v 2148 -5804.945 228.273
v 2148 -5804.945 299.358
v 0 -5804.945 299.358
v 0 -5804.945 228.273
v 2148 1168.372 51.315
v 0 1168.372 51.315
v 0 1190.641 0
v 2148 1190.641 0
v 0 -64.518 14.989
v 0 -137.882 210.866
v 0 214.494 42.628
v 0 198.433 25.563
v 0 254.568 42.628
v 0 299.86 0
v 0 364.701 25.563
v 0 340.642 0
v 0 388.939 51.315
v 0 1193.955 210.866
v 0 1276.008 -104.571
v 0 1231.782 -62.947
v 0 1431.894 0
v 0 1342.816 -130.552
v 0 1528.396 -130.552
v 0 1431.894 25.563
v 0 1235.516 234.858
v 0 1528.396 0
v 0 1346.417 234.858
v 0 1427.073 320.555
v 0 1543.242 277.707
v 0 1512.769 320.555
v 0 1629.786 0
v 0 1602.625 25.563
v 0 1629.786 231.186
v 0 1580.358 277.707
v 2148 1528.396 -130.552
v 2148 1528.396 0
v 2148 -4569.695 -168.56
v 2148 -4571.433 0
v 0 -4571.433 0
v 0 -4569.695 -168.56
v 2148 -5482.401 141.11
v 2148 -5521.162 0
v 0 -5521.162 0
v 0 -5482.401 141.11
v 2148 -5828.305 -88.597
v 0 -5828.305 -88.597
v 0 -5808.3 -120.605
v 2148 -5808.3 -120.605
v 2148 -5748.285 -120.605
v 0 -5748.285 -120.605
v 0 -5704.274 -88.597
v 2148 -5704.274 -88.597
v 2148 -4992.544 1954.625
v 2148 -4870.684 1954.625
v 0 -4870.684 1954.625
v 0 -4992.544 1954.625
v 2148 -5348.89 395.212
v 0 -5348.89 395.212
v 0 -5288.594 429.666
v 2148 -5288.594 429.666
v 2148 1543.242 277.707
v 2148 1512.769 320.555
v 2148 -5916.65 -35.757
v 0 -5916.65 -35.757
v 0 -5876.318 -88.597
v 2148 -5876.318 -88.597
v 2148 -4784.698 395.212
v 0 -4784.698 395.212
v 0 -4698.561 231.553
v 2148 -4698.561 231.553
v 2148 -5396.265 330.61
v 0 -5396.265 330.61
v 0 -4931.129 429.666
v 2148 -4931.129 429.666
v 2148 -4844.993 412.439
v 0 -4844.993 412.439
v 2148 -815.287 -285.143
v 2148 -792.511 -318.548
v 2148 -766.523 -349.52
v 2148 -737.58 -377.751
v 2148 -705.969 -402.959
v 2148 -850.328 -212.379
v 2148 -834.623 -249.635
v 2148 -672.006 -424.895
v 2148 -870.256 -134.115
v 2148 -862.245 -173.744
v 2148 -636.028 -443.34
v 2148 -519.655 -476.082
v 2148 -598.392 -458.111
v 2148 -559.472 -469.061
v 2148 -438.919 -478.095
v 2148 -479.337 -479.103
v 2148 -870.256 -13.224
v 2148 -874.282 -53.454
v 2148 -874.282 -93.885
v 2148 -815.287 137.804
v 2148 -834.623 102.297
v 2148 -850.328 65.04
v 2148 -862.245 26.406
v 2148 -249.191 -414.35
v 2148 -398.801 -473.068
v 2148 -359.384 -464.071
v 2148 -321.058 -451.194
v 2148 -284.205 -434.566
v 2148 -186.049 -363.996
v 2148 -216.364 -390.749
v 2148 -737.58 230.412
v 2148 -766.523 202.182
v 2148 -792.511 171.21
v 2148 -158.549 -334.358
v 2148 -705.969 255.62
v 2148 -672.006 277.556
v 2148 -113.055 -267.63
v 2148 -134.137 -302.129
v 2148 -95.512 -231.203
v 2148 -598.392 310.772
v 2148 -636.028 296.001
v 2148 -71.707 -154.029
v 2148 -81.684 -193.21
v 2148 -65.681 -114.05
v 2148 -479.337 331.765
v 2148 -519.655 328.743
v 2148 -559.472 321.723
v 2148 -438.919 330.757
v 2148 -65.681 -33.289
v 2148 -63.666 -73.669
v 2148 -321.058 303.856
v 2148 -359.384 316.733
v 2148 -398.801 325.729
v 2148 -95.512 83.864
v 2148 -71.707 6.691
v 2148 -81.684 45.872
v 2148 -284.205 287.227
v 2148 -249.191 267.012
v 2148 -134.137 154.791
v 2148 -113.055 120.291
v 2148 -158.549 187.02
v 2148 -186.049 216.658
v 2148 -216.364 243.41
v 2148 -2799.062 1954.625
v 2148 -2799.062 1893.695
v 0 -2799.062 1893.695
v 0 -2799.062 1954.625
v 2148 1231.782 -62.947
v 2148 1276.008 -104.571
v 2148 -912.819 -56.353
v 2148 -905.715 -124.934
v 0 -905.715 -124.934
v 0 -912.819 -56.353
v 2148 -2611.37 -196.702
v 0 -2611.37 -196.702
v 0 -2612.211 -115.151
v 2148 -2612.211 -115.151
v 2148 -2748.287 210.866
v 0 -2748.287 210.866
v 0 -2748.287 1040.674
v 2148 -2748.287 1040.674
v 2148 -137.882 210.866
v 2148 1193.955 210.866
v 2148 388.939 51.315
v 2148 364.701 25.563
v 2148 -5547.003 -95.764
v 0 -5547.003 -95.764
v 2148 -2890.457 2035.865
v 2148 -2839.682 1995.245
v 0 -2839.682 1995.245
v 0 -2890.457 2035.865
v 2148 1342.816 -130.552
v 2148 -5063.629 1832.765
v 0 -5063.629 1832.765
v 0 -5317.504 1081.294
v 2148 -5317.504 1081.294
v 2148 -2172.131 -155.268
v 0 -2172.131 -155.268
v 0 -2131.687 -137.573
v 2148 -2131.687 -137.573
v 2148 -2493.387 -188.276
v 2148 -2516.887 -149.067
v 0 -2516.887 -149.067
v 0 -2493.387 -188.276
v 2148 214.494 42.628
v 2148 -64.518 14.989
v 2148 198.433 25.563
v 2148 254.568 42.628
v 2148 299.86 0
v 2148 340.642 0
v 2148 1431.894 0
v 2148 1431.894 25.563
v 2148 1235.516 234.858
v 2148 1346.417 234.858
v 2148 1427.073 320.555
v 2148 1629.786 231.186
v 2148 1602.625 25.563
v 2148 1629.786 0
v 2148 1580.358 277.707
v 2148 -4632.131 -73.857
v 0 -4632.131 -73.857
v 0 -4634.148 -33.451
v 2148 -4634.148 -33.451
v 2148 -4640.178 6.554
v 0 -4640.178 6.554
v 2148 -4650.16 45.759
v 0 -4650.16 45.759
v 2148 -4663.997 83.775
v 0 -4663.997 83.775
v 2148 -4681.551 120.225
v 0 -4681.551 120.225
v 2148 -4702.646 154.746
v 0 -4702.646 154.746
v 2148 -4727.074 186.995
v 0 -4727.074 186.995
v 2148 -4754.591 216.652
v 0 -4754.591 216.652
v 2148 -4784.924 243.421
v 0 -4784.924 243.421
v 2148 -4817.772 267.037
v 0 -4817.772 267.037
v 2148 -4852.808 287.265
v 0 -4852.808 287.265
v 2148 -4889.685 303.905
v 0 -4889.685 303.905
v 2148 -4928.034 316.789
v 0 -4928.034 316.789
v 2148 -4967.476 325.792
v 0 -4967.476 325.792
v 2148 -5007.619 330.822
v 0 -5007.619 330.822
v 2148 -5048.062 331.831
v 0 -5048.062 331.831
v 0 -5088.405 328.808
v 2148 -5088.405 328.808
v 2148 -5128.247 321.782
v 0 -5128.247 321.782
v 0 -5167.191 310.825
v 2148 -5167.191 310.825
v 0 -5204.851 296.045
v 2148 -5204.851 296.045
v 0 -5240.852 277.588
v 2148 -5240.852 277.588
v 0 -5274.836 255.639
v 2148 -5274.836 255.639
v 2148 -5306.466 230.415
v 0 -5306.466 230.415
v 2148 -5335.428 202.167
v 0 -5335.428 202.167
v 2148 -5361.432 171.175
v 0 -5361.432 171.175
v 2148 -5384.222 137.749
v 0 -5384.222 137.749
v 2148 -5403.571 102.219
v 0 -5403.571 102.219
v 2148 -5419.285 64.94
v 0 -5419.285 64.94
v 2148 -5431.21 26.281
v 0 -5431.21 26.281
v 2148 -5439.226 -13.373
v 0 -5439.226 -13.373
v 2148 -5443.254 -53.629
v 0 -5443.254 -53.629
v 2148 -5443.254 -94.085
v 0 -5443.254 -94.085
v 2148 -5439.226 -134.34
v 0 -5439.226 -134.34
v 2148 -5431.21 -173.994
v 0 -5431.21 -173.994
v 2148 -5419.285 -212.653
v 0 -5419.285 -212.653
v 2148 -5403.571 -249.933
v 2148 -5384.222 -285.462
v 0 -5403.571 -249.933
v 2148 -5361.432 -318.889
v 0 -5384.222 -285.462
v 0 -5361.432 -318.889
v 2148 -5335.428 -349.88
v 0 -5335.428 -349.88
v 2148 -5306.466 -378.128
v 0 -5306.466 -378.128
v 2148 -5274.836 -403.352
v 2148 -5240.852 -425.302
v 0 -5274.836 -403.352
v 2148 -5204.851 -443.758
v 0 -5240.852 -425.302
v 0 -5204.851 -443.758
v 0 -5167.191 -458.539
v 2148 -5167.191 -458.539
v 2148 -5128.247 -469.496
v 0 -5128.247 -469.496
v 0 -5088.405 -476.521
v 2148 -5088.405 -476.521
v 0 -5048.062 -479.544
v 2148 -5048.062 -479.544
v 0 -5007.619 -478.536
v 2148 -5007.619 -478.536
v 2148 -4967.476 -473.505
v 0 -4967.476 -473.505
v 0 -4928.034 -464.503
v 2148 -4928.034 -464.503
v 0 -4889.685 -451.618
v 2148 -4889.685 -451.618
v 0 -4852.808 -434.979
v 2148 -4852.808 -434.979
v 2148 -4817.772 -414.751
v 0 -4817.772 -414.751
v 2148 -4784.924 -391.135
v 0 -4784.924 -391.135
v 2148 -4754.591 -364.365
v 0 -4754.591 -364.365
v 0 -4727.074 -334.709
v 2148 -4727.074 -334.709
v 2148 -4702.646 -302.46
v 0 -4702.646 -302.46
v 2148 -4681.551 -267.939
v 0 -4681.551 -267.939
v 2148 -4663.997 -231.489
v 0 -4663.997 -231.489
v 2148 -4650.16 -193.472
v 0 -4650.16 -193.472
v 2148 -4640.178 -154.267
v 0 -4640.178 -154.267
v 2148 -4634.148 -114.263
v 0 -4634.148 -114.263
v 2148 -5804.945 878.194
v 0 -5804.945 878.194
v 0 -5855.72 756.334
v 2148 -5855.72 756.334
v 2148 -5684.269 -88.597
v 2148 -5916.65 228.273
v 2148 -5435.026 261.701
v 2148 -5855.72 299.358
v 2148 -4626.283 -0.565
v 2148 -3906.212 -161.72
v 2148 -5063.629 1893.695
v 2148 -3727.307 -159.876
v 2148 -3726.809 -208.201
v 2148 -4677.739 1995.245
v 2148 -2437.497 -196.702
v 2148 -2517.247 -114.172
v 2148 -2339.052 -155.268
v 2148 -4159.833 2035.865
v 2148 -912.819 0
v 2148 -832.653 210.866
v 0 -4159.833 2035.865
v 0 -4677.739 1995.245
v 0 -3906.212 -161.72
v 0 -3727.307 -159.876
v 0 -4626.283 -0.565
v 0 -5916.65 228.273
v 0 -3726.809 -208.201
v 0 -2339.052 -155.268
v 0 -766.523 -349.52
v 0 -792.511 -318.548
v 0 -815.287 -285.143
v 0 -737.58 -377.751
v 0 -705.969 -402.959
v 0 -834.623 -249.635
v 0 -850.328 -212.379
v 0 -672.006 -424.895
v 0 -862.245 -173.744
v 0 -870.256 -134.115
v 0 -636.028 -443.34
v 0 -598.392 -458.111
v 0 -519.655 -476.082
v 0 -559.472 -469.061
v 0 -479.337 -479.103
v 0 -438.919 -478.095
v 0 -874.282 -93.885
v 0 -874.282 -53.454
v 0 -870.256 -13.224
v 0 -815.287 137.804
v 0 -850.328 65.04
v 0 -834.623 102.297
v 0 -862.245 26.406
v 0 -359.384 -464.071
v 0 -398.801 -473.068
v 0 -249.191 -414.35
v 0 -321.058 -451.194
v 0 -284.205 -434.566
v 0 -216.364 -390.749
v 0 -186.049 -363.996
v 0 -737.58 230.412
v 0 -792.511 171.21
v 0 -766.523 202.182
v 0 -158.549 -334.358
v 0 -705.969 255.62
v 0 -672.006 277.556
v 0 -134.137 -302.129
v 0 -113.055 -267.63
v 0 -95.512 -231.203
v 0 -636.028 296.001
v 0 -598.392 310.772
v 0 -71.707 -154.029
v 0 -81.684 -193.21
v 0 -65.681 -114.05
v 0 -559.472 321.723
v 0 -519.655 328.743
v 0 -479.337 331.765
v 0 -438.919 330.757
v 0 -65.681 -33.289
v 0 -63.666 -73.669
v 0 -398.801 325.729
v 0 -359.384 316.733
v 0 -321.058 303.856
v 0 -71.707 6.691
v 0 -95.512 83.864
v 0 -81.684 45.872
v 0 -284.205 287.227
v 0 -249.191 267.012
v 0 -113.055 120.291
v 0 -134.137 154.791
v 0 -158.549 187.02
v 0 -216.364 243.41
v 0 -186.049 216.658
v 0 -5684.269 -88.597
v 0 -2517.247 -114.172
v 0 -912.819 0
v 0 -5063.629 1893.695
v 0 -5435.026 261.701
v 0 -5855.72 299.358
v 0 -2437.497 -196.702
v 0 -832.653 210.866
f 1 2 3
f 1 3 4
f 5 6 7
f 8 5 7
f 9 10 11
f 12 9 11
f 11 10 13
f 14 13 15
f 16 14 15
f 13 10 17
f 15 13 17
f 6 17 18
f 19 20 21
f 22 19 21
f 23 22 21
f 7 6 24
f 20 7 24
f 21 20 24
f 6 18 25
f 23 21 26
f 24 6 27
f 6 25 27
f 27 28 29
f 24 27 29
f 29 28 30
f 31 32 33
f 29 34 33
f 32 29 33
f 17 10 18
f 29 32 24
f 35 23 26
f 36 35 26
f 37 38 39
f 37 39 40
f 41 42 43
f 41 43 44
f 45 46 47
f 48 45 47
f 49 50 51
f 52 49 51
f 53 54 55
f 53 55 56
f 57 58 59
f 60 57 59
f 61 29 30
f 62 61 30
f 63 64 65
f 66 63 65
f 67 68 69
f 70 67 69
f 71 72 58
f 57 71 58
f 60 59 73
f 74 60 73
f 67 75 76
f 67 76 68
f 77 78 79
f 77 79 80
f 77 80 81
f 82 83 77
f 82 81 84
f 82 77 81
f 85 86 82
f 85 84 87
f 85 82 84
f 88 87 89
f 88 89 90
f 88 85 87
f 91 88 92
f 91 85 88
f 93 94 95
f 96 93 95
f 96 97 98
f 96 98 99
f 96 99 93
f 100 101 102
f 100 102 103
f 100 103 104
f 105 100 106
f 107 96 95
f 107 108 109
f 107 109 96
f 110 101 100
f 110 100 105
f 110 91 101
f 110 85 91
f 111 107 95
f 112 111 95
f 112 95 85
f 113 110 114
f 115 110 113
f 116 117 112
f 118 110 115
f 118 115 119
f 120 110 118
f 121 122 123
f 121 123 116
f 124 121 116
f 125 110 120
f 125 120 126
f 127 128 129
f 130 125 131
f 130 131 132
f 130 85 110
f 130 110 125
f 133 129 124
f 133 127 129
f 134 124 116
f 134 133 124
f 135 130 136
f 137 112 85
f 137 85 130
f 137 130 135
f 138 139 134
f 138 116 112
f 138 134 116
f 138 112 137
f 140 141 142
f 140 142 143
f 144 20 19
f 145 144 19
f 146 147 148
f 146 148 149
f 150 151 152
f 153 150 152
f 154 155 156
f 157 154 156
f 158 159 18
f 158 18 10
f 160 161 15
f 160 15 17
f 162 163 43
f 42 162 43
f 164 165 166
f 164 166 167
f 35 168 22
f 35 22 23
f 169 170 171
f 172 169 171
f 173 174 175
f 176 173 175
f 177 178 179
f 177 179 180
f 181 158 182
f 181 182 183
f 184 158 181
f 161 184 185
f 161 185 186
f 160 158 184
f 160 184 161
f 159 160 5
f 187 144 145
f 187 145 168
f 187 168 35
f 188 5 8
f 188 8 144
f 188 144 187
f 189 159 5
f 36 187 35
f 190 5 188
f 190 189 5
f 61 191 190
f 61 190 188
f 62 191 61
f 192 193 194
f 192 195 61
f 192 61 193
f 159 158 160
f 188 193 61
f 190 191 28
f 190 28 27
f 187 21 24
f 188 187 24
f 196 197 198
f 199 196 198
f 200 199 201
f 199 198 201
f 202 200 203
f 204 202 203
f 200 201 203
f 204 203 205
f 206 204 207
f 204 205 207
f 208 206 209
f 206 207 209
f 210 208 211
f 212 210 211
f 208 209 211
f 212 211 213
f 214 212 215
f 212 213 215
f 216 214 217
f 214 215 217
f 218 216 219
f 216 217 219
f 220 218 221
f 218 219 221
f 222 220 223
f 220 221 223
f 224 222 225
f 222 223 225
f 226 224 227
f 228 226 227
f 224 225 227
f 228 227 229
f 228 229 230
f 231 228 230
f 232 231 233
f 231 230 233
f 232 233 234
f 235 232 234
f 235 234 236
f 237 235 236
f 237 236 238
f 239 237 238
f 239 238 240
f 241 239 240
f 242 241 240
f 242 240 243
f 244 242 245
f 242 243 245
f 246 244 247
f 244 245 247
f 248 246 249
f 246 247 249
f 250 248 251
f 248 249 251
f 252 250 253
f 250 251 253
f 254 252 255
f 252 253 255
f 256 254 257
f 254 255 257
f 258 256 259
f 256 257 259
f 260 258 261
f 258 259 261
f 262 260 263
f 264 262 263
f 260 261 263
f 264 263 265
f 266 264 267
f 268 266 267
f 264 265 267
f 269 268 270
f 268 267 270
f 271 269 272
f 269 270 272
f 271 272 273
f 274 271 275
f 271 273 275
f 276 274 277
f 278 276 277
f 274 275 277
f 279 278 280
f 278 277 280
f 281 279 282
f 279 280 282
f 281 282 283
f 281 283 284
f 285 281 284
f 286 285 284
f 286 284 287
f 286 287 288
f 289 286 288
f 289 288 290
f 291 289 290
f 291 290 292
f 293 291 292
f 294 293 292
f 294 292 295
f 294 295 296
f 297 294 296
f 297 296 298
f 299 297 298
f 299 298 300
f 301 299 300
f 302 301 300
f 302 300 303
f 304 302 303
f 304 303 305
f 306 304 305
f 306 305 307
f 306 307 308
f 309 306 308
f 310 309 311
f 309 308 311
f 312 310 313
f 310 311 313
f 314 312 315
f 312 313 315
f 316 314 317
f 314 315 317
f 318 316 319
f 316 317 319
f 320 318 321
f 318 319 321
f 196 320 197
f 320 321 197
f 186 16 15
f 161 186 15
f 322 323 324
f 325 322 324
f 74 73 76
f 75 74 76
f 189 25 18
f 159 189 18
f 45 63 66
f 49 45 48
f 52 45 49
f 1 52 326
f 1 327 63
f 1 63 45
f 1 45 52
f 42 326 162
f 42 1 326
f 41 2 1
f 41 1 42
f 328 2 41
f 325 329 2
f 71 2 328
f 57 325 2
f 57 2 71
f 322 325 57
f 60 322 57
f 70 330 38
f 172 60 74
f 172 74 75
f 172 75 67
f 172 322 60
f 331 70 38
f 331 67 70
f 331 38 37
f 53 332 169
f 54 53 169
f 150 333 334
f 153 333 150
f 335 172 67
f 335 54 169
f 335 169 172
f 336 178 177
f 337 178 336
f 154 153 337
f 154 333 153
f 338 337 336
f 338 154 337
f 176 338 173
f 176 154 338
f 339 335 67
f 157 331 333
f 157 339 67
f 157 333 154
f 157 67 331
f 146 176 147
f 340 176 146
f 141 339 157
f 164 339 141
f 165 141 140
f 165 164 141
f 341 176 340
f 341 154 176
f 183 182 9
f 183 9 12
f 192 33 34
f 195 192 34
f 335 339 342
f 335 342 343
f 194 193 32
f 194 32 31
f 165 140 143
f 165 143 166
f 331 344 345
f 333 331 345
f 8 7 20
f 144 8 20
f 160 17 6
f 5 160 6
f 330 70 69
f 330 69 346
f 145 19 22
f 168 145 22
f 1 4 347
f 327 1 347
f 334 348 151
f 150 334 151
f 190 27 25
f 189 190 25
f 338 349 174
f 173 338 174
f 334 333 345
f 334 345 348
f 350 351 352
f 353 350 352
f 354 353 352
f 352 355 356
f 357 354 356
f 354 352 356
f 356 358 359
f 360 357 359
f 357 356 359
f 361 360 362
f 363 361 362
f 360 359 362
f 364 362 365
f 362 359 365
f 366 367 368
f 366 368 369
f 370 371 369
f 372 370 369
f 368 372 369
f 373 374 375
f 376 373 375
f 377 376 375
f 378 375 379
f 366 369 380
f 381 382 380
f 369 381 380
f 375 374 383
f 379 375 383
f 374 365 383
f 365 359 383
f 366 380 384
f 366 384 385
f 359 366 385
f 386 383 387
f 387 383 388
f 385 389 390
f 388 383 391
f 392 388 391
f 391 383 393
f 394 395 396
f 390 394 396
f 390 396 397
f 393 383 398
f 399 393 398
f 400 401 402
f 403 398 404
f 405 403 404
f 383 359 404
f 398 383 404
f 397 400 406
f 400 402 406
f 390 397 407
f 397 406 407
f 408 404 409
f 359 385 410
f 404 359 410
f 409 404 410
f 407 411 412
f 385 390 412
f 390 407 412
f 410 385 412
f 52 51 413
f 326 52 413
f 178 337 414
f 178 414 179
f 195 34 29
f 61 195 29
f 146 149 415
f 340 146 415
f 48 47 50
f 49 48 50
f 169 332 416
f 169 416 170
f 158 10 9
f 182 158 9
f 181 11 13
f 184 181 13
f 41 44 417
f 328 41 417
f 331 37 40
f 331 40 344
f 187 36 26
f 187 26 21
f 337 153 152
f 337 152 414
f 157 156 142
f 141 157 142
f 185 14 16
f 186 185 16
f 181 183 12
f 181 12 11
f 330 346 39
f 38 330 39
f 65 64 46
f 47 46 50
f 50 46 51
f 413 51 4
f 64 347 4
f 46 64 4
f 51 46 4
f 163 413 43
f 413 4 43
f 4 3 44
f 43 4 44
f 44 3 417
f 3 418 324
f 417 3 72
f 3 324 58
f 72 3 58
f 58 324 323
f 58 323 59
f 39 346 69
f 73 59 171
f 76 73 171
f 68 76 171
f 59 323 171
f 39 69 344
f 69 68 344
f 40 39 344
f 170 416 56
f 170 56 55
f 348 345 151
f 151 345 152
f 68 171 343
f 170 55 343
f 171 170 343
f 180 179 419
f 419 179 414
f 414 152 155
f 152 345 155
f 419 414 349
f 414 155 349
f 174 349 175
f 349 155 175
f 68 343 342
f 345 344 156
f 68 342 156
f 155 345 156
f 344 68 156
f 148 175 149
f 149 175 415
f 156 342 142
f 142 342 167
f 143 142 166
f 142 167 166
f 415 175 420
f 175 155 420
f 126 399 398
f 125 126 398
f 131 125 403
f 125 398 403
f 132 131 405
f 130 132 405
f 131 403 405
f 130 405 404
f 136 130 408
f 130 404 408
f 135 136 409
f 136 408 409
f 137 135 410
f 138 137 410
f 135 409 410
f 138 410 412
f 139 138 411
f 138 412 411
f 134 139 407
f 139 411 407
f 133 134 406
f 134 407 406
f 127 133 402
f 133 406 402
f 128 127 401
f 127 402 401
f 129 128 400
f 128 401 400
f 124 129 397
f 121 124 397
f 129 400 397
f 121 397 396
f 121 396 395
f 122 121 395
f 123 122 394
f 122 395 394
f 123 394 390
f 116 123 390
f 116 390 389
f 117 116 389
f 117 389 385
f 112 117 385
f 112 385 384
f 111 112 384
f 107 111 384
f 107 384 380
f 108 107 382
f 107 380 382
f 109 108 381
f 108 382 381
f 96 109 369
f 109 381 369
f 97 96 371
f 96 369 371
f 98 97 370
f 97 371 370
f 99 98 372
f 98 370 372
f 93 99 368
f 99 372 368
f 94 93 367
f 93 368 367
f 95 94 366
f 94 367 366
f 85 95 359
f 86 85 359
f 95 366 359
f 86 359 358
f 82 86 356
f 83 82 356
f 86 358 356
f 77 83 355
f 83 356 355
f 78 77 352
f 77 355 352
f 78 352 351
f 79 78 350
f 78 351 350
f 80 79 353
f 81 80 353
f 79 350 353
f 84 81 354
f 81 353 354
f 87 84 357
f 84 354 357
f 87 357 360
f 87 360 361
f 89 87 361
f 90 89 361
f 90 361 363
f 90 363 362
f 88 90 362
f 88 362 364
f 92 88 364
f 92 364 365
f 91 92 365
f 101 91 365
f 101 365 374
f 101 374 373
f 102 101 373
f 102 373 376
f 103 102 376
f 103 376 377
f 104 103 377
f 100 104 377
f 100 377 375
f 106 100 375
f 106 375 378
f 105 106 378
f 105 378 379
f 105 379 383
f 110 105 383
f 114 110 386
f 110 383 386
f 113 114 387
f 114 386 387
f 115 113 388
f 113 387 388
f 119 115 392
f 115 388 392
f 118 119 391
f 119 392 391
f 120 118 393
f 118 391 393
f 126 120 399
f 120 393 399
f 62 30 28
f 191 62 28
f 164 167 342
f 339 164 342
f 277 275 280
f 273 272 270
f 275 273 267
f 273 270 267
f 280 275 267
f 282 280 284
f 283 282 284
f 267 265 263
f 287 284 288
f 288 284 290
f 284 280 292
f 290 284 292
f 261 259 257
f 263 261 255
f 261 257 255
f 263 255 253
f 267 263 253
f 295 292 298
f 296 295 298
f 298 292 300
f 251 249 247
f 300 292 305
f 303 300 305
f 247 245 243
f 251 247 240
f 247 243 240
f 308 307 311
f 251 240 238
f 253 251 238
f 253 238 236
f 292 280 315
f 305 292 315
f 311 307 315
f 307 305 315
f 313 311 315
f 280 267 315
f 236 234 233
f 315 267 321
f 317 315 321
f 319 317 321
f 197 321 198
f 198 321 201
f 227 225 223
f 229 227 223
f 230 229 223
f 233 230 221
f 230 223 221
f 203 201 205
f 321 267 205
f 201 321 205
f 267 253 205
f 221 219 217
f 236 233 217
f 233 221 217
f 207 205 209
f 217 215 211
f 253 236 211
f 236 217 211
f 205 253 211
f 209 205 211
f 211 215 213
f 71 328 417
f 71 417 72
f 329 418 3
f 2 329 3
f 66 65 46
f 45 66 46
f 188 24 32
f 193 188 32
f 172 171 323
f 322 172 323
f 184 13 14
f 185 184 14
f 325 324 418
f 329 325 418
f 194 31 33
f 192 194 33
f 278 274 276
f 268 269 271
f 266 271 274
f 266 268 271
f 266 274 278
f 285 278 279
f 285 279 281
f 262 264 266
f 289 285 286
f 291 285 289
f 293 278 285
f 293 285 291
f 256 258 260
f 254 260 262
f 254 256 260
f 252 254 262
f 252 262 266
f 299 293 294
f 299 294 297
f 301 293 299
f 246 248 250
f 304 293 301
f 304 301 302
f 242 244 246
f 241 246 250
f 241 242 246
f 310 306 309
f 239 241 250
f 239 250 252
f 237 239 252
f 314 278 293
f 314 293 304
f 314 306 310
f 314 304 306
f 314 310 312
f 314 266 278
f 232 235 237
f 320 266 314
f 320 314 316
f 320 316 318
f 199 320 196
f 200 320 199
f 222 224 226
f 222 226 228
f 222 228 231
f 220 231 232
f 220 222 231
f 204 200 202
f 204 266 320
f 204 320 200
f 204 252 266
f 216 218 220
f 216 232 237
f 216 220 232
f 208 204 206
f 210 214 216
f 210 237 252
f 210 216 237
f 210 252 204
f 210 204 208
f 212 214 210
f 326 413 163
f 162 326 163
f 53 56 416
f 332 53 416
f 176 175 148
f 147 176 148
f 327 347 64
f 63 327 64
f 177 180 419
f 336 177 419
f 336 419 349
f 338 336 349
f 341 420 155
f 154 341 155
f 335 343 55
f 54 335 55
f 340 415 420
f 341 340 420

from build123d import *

# Parameters (mm, degrees)
F1_R     = 405.813739
F1_R_2   = 405.560096
F2_DEPTH = 2148
F3_DEPTH = 2148


with BuildPart() as f2:
    # F1 (on Right) → F2 (new body)
    with BuildSketch(Plane.YZ):
        with Locations((-5037.945043, -73.856739)):
            Circle(F1_R)
        with Locations((-469.226141, -73.669252)):
            Circle(F1_R_2)
    extrude(amount=F2_DEPTH)


with BuildPart() as f3:
    # F0 (on Right) → F3 (new body)
    with BuildSketch(Plane.YZ):
        Polygon((-5916.649738, 86.103295), (-5916.649738, -35.756788), (-5876.318, -88.596982), (-5828.305358, -88.596982), (-5808.300264, -120.605177), (-5748.284984, -120.605177), (-5704.273778, -88.596982), (-5684.268685, -88.596982), (-5547.002966, -95.764487), (-5521.161923, 0), (-5482.400775, 141.11002), (-5435.025808, 261.700725), (-5396.26466, 330.609669), (-5348.889692, 395.211808), (-5288.594203, 429.666254), (-4931.129219, 429.666254), (-4844.993104, 412.439031), (-4784.697614, 395.211808), (-4698.561499, 231.553032), (-4626.283299, -0.565466), (-4571.433105, 0), (-4569.695373, -168.560047), (-3906.212071, -161.720012), (-3727.307303, -159.875633), (-3726.809104, -208.200929), (-2611.369809, -196.701554), (-2612.210537, -115.151014), (-2517.24668, -114.172005), (-2516.886935, -149.067322), (-2493.387424, -188.275581), (-2437.496718, -196.701554), (-2339.05249, -155.267758), (-2217.631324, -155.267758), (-2172.131168, -155.267758), (-2131.686887, -137.573319), (-905.714686, -124.934429), (-912.818677, -56.352993), (-912.818677, 0), (-832.652874, 210.86643), (-2748.287256, 210.86643), (-2748.287256, 228.273416), (-2748.287256, 675.093762), (-2748.287256, 1040.674108), (-2799.062109, 1893.69476), (-2799.062109, 1954.624792), (-2839.682199, 1995.244883), (-2890.457261, 2035.864974), (-2971.697442, 2035.864974), (-4159.833373, 2035.864974), (-4677.738746, 1995.244883), (-4870.683812, 1954.624792), (-4921.458873, 1954.624792), (-4992.543875, 1954.624792), (-5063.628877, 1893.69476), (-5063.628877, 1832.764729), (-5317.504183, 1081.294095), (-5804.944854, 878.193954), (-5855.719915, 756.333839), (-5855.719915, 664.938791), (-5855.719915, 299.358471), (-5804.944854, 299.358471), (-5804.944854, 228.273416), (-5916.649738, 228.273416), align=None)
        Polygon((1193.955189, 210.86643), (-137.882473, 210.86643), (-64.518051, 14.988754), (198.433204, 25.563356), (214.493958, 42.627917), (254.568287, 42.627917), (299.860477, 0), (340.641854, 0), (364.701468, 25.563356), (388.938553, 51.315275), (1168.371792, 51.315275), (1190.641318, 0), (1231.782024, -62.94715), (1276.007797, -104.571381), (1342.816479, -130.552484), (1528.395719, -130.552484), (1528.395719, 0), (1431.894476, 0), (1431.894476, 25.563356), (1602.624882, 25.563356), (1629.785965, 0), (1629.785965, 210.86643), (1629.785965, 231.186349), (1580.358015, 277.706744), (1543.242104, 277.706744), (1512.769363, 320.555027), (1427.072771, 320.555027), (1346.417228, 234.858461), (1235.515805, 234.858461), align=None)
    extrude(amount=F3_DEPTH)


solid = Compound([f2.part, f3.part])
